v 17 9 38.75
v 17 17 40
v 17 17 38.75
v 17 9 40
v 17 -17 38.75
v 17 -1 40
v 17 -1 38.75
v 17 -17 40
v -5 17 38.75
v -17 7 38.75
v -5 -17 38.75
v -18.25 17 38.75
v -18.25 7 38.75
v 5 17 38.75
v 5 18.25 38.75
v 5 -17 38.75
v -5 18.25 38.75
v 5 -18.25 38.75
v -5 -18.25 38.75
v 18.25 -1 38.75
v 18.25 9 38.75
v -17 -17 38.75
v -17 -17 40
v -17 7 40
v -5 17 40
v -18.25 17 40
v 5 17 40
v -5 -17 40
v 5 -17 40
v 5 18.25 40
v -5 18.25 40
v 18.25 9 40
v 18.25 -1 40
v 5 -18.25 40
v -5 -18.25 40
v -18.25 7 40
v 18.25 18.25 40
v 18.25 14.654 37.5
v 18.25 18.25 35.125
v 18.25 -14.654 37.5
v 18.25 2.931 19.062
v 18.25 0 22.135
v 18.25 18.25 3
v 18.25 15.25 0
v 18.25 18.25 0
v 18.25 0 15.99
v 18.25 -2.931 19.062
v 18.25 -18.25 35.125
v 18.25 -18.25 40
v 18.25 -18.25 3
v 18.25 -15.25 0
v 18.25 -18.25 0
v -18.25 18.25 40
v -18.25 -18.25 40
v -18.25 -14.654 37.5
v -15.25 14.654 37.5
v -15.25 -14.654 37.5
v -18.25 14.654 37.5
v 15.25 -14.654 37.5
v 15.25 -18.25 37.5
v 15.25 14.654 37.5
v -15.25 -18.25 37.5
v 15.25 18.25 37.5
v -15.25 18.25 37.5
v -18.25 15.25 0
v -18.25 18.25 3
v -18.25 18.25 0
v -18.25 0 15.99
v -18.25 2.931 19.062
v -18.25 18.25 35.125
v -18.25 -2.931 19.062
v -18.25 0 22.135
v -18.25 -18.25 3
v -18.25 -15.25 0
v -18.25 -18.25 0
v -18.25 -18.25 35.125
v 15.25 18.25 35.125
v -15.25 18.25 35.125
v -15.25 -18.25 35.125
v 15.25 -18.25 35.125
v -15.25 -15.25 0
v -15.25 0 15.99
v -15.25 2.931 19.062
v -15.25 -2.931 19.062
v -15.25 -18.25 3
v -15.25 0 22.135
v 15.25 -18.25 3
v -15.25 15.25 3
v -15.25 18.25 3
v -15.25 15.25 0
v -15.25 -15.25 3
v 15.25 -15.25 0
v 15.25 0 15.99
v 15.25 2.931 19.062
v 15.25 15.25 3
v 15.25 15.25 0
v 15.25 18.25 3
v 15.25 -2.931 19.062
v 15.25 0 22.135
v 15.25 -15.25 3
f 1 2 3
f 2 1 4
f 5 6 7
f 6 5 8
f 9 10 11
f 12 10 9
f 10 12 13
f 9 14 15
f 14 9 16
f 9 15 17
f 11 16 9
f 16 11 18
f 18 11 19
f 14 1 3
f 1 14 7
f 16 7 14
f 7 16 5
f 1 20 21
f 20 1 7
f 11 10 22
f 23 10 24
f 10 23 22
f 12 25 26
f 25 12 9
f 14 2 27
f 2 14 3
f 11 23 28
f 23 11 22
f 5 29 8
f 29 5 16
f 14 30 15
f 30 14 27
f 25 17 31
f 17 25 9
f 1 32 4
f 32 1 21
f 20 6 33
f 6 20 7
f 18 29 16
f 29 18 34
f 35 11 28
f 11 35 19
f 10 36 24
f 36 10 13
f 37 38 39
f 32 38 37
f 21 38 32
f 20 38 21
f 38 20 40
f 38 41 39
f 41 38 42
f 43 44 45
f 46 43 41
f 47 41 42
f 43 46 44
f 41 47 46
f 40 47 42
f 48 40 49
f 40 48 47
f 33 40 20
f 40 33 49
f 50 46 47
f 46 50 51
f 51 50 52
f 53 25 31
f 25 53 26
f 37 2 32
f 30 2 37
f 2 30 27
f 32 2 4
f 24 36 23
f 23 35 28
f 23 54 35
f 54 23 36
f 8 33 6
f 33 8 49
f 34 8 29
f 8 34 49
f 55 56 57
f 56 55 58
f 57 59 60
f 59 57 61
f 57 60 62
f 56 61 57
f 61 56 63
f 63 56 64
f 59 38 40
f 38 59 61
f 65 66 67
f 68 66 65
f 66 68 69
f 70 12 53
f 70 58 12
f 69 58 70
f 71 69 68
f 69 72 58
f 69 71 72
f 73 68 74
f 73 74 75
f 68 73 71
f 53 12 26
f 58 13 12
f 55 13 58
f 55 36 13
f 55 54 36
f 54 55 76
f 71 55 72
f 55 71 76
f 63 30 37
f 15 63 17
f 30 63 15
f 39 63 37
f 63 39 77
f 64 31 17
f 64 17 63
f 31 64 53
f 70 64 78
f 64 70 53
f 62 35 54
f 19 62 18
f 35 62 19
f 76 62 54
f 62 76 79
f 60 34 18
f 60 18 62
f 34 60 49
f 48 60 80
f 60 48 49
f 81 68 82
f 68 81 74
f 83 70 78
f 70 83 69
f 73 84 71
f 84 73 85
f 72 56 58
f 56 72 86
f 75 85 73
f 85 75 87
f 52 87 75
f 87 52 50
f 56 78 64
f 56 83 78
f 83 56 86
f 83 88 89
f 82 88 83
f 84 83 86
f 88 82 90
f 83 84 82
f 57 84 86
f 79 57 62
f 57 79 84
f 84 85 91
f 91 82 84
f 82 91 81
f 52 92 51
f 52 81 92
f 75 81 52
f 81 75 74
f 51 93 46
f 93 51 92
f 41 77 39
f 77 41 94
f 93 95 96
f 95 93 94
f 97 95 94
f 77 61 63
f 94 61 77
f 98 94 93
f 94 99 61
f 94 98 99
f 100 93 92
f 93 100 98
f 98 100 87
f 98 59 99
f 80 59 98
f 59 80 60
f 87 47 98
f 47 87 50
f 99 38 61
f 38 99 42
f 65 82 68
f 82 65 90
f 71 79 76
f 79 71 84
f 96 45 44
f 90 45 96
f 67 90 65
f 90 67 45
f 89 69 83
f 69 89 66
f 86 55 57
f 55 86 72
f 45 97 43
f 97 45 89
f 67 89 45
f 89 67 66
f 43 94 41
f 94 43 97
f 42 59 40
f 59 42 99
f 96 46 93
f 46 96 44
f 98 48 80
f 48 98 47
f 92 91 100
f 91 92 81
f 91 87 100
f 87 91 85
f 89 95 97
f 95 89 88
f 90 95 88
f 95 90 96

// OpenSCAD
$fn=60;




foam_height = 3;

module strut(sx1,sy1,sx2,sy2,sz, unit)
{
    hull()
    {
        translate([sx1,sy1,unit/2]) cube(unit,center=true);
        translate([sx2,sy2,sz]) cube(unit,center=true);
    }
    
}

module struts(sx1,sy1,sx2,sy2,sz, unit)
{
    strut(sx1,sy1,sx2,sy2,sz, unit);
    mirror([1,0,0]) strut(sx1,sy1,sx2,sy2,sz, unit);
    mirror([0,1,0]) strut(sx1,sy1,sx2,sy2,sz, unit);
    mirror([1,0,0]) mirror([0,1,0]) strut(sx1,sy1,sx2,sy2,sz, unit);
    strut(sx1,sy1,-sx1,sy1,unit/2, unit);
    mirror([0,1,0])  strut(sx1,sy1,-sx1,sy1,unit/2, unit);
}

module vtx_case()
{
    inside=34;
    t=1.25;
//    z_i=5+5-5;
    z_i=t*2;

    cx=inside+t*2;
    cy=inside+t*2;
    cz=z_i;
    vtx_height = 40;

    translate([0,0,vtx_height-cz/2]) difference()
    {
        cube([cx,cy,cz],center=true);   
        translate([0,0,t]) rotate([0,0,0]) union()
        {
            cube([inside,inside,z_i],center=true);
            // usb 
            translate([0,inside/2,0]) cube([10,inside,z_i], center=true);
            // cam
            translate([inside/2,inside/2-10/2-8,0]) cube([inside,10,z_i], center=true);
            // cables FC 
            translate([0,-inside/2,0]) cube([10,inside,z_i], center=true);
            // Antenna
            translate([-inside/2,inside/2-10/2,0]) cube([inside,10,z_i], center=true);
        }
    }
    struts(-cx/2+foam_height/2,-cy/2+foam_height/2,-cx/2+foam_height/2,-(-cy/2+foam_height/2),vtx_height-cz-foam_height/2+t/2, foam_height);
}




vtx_case();
